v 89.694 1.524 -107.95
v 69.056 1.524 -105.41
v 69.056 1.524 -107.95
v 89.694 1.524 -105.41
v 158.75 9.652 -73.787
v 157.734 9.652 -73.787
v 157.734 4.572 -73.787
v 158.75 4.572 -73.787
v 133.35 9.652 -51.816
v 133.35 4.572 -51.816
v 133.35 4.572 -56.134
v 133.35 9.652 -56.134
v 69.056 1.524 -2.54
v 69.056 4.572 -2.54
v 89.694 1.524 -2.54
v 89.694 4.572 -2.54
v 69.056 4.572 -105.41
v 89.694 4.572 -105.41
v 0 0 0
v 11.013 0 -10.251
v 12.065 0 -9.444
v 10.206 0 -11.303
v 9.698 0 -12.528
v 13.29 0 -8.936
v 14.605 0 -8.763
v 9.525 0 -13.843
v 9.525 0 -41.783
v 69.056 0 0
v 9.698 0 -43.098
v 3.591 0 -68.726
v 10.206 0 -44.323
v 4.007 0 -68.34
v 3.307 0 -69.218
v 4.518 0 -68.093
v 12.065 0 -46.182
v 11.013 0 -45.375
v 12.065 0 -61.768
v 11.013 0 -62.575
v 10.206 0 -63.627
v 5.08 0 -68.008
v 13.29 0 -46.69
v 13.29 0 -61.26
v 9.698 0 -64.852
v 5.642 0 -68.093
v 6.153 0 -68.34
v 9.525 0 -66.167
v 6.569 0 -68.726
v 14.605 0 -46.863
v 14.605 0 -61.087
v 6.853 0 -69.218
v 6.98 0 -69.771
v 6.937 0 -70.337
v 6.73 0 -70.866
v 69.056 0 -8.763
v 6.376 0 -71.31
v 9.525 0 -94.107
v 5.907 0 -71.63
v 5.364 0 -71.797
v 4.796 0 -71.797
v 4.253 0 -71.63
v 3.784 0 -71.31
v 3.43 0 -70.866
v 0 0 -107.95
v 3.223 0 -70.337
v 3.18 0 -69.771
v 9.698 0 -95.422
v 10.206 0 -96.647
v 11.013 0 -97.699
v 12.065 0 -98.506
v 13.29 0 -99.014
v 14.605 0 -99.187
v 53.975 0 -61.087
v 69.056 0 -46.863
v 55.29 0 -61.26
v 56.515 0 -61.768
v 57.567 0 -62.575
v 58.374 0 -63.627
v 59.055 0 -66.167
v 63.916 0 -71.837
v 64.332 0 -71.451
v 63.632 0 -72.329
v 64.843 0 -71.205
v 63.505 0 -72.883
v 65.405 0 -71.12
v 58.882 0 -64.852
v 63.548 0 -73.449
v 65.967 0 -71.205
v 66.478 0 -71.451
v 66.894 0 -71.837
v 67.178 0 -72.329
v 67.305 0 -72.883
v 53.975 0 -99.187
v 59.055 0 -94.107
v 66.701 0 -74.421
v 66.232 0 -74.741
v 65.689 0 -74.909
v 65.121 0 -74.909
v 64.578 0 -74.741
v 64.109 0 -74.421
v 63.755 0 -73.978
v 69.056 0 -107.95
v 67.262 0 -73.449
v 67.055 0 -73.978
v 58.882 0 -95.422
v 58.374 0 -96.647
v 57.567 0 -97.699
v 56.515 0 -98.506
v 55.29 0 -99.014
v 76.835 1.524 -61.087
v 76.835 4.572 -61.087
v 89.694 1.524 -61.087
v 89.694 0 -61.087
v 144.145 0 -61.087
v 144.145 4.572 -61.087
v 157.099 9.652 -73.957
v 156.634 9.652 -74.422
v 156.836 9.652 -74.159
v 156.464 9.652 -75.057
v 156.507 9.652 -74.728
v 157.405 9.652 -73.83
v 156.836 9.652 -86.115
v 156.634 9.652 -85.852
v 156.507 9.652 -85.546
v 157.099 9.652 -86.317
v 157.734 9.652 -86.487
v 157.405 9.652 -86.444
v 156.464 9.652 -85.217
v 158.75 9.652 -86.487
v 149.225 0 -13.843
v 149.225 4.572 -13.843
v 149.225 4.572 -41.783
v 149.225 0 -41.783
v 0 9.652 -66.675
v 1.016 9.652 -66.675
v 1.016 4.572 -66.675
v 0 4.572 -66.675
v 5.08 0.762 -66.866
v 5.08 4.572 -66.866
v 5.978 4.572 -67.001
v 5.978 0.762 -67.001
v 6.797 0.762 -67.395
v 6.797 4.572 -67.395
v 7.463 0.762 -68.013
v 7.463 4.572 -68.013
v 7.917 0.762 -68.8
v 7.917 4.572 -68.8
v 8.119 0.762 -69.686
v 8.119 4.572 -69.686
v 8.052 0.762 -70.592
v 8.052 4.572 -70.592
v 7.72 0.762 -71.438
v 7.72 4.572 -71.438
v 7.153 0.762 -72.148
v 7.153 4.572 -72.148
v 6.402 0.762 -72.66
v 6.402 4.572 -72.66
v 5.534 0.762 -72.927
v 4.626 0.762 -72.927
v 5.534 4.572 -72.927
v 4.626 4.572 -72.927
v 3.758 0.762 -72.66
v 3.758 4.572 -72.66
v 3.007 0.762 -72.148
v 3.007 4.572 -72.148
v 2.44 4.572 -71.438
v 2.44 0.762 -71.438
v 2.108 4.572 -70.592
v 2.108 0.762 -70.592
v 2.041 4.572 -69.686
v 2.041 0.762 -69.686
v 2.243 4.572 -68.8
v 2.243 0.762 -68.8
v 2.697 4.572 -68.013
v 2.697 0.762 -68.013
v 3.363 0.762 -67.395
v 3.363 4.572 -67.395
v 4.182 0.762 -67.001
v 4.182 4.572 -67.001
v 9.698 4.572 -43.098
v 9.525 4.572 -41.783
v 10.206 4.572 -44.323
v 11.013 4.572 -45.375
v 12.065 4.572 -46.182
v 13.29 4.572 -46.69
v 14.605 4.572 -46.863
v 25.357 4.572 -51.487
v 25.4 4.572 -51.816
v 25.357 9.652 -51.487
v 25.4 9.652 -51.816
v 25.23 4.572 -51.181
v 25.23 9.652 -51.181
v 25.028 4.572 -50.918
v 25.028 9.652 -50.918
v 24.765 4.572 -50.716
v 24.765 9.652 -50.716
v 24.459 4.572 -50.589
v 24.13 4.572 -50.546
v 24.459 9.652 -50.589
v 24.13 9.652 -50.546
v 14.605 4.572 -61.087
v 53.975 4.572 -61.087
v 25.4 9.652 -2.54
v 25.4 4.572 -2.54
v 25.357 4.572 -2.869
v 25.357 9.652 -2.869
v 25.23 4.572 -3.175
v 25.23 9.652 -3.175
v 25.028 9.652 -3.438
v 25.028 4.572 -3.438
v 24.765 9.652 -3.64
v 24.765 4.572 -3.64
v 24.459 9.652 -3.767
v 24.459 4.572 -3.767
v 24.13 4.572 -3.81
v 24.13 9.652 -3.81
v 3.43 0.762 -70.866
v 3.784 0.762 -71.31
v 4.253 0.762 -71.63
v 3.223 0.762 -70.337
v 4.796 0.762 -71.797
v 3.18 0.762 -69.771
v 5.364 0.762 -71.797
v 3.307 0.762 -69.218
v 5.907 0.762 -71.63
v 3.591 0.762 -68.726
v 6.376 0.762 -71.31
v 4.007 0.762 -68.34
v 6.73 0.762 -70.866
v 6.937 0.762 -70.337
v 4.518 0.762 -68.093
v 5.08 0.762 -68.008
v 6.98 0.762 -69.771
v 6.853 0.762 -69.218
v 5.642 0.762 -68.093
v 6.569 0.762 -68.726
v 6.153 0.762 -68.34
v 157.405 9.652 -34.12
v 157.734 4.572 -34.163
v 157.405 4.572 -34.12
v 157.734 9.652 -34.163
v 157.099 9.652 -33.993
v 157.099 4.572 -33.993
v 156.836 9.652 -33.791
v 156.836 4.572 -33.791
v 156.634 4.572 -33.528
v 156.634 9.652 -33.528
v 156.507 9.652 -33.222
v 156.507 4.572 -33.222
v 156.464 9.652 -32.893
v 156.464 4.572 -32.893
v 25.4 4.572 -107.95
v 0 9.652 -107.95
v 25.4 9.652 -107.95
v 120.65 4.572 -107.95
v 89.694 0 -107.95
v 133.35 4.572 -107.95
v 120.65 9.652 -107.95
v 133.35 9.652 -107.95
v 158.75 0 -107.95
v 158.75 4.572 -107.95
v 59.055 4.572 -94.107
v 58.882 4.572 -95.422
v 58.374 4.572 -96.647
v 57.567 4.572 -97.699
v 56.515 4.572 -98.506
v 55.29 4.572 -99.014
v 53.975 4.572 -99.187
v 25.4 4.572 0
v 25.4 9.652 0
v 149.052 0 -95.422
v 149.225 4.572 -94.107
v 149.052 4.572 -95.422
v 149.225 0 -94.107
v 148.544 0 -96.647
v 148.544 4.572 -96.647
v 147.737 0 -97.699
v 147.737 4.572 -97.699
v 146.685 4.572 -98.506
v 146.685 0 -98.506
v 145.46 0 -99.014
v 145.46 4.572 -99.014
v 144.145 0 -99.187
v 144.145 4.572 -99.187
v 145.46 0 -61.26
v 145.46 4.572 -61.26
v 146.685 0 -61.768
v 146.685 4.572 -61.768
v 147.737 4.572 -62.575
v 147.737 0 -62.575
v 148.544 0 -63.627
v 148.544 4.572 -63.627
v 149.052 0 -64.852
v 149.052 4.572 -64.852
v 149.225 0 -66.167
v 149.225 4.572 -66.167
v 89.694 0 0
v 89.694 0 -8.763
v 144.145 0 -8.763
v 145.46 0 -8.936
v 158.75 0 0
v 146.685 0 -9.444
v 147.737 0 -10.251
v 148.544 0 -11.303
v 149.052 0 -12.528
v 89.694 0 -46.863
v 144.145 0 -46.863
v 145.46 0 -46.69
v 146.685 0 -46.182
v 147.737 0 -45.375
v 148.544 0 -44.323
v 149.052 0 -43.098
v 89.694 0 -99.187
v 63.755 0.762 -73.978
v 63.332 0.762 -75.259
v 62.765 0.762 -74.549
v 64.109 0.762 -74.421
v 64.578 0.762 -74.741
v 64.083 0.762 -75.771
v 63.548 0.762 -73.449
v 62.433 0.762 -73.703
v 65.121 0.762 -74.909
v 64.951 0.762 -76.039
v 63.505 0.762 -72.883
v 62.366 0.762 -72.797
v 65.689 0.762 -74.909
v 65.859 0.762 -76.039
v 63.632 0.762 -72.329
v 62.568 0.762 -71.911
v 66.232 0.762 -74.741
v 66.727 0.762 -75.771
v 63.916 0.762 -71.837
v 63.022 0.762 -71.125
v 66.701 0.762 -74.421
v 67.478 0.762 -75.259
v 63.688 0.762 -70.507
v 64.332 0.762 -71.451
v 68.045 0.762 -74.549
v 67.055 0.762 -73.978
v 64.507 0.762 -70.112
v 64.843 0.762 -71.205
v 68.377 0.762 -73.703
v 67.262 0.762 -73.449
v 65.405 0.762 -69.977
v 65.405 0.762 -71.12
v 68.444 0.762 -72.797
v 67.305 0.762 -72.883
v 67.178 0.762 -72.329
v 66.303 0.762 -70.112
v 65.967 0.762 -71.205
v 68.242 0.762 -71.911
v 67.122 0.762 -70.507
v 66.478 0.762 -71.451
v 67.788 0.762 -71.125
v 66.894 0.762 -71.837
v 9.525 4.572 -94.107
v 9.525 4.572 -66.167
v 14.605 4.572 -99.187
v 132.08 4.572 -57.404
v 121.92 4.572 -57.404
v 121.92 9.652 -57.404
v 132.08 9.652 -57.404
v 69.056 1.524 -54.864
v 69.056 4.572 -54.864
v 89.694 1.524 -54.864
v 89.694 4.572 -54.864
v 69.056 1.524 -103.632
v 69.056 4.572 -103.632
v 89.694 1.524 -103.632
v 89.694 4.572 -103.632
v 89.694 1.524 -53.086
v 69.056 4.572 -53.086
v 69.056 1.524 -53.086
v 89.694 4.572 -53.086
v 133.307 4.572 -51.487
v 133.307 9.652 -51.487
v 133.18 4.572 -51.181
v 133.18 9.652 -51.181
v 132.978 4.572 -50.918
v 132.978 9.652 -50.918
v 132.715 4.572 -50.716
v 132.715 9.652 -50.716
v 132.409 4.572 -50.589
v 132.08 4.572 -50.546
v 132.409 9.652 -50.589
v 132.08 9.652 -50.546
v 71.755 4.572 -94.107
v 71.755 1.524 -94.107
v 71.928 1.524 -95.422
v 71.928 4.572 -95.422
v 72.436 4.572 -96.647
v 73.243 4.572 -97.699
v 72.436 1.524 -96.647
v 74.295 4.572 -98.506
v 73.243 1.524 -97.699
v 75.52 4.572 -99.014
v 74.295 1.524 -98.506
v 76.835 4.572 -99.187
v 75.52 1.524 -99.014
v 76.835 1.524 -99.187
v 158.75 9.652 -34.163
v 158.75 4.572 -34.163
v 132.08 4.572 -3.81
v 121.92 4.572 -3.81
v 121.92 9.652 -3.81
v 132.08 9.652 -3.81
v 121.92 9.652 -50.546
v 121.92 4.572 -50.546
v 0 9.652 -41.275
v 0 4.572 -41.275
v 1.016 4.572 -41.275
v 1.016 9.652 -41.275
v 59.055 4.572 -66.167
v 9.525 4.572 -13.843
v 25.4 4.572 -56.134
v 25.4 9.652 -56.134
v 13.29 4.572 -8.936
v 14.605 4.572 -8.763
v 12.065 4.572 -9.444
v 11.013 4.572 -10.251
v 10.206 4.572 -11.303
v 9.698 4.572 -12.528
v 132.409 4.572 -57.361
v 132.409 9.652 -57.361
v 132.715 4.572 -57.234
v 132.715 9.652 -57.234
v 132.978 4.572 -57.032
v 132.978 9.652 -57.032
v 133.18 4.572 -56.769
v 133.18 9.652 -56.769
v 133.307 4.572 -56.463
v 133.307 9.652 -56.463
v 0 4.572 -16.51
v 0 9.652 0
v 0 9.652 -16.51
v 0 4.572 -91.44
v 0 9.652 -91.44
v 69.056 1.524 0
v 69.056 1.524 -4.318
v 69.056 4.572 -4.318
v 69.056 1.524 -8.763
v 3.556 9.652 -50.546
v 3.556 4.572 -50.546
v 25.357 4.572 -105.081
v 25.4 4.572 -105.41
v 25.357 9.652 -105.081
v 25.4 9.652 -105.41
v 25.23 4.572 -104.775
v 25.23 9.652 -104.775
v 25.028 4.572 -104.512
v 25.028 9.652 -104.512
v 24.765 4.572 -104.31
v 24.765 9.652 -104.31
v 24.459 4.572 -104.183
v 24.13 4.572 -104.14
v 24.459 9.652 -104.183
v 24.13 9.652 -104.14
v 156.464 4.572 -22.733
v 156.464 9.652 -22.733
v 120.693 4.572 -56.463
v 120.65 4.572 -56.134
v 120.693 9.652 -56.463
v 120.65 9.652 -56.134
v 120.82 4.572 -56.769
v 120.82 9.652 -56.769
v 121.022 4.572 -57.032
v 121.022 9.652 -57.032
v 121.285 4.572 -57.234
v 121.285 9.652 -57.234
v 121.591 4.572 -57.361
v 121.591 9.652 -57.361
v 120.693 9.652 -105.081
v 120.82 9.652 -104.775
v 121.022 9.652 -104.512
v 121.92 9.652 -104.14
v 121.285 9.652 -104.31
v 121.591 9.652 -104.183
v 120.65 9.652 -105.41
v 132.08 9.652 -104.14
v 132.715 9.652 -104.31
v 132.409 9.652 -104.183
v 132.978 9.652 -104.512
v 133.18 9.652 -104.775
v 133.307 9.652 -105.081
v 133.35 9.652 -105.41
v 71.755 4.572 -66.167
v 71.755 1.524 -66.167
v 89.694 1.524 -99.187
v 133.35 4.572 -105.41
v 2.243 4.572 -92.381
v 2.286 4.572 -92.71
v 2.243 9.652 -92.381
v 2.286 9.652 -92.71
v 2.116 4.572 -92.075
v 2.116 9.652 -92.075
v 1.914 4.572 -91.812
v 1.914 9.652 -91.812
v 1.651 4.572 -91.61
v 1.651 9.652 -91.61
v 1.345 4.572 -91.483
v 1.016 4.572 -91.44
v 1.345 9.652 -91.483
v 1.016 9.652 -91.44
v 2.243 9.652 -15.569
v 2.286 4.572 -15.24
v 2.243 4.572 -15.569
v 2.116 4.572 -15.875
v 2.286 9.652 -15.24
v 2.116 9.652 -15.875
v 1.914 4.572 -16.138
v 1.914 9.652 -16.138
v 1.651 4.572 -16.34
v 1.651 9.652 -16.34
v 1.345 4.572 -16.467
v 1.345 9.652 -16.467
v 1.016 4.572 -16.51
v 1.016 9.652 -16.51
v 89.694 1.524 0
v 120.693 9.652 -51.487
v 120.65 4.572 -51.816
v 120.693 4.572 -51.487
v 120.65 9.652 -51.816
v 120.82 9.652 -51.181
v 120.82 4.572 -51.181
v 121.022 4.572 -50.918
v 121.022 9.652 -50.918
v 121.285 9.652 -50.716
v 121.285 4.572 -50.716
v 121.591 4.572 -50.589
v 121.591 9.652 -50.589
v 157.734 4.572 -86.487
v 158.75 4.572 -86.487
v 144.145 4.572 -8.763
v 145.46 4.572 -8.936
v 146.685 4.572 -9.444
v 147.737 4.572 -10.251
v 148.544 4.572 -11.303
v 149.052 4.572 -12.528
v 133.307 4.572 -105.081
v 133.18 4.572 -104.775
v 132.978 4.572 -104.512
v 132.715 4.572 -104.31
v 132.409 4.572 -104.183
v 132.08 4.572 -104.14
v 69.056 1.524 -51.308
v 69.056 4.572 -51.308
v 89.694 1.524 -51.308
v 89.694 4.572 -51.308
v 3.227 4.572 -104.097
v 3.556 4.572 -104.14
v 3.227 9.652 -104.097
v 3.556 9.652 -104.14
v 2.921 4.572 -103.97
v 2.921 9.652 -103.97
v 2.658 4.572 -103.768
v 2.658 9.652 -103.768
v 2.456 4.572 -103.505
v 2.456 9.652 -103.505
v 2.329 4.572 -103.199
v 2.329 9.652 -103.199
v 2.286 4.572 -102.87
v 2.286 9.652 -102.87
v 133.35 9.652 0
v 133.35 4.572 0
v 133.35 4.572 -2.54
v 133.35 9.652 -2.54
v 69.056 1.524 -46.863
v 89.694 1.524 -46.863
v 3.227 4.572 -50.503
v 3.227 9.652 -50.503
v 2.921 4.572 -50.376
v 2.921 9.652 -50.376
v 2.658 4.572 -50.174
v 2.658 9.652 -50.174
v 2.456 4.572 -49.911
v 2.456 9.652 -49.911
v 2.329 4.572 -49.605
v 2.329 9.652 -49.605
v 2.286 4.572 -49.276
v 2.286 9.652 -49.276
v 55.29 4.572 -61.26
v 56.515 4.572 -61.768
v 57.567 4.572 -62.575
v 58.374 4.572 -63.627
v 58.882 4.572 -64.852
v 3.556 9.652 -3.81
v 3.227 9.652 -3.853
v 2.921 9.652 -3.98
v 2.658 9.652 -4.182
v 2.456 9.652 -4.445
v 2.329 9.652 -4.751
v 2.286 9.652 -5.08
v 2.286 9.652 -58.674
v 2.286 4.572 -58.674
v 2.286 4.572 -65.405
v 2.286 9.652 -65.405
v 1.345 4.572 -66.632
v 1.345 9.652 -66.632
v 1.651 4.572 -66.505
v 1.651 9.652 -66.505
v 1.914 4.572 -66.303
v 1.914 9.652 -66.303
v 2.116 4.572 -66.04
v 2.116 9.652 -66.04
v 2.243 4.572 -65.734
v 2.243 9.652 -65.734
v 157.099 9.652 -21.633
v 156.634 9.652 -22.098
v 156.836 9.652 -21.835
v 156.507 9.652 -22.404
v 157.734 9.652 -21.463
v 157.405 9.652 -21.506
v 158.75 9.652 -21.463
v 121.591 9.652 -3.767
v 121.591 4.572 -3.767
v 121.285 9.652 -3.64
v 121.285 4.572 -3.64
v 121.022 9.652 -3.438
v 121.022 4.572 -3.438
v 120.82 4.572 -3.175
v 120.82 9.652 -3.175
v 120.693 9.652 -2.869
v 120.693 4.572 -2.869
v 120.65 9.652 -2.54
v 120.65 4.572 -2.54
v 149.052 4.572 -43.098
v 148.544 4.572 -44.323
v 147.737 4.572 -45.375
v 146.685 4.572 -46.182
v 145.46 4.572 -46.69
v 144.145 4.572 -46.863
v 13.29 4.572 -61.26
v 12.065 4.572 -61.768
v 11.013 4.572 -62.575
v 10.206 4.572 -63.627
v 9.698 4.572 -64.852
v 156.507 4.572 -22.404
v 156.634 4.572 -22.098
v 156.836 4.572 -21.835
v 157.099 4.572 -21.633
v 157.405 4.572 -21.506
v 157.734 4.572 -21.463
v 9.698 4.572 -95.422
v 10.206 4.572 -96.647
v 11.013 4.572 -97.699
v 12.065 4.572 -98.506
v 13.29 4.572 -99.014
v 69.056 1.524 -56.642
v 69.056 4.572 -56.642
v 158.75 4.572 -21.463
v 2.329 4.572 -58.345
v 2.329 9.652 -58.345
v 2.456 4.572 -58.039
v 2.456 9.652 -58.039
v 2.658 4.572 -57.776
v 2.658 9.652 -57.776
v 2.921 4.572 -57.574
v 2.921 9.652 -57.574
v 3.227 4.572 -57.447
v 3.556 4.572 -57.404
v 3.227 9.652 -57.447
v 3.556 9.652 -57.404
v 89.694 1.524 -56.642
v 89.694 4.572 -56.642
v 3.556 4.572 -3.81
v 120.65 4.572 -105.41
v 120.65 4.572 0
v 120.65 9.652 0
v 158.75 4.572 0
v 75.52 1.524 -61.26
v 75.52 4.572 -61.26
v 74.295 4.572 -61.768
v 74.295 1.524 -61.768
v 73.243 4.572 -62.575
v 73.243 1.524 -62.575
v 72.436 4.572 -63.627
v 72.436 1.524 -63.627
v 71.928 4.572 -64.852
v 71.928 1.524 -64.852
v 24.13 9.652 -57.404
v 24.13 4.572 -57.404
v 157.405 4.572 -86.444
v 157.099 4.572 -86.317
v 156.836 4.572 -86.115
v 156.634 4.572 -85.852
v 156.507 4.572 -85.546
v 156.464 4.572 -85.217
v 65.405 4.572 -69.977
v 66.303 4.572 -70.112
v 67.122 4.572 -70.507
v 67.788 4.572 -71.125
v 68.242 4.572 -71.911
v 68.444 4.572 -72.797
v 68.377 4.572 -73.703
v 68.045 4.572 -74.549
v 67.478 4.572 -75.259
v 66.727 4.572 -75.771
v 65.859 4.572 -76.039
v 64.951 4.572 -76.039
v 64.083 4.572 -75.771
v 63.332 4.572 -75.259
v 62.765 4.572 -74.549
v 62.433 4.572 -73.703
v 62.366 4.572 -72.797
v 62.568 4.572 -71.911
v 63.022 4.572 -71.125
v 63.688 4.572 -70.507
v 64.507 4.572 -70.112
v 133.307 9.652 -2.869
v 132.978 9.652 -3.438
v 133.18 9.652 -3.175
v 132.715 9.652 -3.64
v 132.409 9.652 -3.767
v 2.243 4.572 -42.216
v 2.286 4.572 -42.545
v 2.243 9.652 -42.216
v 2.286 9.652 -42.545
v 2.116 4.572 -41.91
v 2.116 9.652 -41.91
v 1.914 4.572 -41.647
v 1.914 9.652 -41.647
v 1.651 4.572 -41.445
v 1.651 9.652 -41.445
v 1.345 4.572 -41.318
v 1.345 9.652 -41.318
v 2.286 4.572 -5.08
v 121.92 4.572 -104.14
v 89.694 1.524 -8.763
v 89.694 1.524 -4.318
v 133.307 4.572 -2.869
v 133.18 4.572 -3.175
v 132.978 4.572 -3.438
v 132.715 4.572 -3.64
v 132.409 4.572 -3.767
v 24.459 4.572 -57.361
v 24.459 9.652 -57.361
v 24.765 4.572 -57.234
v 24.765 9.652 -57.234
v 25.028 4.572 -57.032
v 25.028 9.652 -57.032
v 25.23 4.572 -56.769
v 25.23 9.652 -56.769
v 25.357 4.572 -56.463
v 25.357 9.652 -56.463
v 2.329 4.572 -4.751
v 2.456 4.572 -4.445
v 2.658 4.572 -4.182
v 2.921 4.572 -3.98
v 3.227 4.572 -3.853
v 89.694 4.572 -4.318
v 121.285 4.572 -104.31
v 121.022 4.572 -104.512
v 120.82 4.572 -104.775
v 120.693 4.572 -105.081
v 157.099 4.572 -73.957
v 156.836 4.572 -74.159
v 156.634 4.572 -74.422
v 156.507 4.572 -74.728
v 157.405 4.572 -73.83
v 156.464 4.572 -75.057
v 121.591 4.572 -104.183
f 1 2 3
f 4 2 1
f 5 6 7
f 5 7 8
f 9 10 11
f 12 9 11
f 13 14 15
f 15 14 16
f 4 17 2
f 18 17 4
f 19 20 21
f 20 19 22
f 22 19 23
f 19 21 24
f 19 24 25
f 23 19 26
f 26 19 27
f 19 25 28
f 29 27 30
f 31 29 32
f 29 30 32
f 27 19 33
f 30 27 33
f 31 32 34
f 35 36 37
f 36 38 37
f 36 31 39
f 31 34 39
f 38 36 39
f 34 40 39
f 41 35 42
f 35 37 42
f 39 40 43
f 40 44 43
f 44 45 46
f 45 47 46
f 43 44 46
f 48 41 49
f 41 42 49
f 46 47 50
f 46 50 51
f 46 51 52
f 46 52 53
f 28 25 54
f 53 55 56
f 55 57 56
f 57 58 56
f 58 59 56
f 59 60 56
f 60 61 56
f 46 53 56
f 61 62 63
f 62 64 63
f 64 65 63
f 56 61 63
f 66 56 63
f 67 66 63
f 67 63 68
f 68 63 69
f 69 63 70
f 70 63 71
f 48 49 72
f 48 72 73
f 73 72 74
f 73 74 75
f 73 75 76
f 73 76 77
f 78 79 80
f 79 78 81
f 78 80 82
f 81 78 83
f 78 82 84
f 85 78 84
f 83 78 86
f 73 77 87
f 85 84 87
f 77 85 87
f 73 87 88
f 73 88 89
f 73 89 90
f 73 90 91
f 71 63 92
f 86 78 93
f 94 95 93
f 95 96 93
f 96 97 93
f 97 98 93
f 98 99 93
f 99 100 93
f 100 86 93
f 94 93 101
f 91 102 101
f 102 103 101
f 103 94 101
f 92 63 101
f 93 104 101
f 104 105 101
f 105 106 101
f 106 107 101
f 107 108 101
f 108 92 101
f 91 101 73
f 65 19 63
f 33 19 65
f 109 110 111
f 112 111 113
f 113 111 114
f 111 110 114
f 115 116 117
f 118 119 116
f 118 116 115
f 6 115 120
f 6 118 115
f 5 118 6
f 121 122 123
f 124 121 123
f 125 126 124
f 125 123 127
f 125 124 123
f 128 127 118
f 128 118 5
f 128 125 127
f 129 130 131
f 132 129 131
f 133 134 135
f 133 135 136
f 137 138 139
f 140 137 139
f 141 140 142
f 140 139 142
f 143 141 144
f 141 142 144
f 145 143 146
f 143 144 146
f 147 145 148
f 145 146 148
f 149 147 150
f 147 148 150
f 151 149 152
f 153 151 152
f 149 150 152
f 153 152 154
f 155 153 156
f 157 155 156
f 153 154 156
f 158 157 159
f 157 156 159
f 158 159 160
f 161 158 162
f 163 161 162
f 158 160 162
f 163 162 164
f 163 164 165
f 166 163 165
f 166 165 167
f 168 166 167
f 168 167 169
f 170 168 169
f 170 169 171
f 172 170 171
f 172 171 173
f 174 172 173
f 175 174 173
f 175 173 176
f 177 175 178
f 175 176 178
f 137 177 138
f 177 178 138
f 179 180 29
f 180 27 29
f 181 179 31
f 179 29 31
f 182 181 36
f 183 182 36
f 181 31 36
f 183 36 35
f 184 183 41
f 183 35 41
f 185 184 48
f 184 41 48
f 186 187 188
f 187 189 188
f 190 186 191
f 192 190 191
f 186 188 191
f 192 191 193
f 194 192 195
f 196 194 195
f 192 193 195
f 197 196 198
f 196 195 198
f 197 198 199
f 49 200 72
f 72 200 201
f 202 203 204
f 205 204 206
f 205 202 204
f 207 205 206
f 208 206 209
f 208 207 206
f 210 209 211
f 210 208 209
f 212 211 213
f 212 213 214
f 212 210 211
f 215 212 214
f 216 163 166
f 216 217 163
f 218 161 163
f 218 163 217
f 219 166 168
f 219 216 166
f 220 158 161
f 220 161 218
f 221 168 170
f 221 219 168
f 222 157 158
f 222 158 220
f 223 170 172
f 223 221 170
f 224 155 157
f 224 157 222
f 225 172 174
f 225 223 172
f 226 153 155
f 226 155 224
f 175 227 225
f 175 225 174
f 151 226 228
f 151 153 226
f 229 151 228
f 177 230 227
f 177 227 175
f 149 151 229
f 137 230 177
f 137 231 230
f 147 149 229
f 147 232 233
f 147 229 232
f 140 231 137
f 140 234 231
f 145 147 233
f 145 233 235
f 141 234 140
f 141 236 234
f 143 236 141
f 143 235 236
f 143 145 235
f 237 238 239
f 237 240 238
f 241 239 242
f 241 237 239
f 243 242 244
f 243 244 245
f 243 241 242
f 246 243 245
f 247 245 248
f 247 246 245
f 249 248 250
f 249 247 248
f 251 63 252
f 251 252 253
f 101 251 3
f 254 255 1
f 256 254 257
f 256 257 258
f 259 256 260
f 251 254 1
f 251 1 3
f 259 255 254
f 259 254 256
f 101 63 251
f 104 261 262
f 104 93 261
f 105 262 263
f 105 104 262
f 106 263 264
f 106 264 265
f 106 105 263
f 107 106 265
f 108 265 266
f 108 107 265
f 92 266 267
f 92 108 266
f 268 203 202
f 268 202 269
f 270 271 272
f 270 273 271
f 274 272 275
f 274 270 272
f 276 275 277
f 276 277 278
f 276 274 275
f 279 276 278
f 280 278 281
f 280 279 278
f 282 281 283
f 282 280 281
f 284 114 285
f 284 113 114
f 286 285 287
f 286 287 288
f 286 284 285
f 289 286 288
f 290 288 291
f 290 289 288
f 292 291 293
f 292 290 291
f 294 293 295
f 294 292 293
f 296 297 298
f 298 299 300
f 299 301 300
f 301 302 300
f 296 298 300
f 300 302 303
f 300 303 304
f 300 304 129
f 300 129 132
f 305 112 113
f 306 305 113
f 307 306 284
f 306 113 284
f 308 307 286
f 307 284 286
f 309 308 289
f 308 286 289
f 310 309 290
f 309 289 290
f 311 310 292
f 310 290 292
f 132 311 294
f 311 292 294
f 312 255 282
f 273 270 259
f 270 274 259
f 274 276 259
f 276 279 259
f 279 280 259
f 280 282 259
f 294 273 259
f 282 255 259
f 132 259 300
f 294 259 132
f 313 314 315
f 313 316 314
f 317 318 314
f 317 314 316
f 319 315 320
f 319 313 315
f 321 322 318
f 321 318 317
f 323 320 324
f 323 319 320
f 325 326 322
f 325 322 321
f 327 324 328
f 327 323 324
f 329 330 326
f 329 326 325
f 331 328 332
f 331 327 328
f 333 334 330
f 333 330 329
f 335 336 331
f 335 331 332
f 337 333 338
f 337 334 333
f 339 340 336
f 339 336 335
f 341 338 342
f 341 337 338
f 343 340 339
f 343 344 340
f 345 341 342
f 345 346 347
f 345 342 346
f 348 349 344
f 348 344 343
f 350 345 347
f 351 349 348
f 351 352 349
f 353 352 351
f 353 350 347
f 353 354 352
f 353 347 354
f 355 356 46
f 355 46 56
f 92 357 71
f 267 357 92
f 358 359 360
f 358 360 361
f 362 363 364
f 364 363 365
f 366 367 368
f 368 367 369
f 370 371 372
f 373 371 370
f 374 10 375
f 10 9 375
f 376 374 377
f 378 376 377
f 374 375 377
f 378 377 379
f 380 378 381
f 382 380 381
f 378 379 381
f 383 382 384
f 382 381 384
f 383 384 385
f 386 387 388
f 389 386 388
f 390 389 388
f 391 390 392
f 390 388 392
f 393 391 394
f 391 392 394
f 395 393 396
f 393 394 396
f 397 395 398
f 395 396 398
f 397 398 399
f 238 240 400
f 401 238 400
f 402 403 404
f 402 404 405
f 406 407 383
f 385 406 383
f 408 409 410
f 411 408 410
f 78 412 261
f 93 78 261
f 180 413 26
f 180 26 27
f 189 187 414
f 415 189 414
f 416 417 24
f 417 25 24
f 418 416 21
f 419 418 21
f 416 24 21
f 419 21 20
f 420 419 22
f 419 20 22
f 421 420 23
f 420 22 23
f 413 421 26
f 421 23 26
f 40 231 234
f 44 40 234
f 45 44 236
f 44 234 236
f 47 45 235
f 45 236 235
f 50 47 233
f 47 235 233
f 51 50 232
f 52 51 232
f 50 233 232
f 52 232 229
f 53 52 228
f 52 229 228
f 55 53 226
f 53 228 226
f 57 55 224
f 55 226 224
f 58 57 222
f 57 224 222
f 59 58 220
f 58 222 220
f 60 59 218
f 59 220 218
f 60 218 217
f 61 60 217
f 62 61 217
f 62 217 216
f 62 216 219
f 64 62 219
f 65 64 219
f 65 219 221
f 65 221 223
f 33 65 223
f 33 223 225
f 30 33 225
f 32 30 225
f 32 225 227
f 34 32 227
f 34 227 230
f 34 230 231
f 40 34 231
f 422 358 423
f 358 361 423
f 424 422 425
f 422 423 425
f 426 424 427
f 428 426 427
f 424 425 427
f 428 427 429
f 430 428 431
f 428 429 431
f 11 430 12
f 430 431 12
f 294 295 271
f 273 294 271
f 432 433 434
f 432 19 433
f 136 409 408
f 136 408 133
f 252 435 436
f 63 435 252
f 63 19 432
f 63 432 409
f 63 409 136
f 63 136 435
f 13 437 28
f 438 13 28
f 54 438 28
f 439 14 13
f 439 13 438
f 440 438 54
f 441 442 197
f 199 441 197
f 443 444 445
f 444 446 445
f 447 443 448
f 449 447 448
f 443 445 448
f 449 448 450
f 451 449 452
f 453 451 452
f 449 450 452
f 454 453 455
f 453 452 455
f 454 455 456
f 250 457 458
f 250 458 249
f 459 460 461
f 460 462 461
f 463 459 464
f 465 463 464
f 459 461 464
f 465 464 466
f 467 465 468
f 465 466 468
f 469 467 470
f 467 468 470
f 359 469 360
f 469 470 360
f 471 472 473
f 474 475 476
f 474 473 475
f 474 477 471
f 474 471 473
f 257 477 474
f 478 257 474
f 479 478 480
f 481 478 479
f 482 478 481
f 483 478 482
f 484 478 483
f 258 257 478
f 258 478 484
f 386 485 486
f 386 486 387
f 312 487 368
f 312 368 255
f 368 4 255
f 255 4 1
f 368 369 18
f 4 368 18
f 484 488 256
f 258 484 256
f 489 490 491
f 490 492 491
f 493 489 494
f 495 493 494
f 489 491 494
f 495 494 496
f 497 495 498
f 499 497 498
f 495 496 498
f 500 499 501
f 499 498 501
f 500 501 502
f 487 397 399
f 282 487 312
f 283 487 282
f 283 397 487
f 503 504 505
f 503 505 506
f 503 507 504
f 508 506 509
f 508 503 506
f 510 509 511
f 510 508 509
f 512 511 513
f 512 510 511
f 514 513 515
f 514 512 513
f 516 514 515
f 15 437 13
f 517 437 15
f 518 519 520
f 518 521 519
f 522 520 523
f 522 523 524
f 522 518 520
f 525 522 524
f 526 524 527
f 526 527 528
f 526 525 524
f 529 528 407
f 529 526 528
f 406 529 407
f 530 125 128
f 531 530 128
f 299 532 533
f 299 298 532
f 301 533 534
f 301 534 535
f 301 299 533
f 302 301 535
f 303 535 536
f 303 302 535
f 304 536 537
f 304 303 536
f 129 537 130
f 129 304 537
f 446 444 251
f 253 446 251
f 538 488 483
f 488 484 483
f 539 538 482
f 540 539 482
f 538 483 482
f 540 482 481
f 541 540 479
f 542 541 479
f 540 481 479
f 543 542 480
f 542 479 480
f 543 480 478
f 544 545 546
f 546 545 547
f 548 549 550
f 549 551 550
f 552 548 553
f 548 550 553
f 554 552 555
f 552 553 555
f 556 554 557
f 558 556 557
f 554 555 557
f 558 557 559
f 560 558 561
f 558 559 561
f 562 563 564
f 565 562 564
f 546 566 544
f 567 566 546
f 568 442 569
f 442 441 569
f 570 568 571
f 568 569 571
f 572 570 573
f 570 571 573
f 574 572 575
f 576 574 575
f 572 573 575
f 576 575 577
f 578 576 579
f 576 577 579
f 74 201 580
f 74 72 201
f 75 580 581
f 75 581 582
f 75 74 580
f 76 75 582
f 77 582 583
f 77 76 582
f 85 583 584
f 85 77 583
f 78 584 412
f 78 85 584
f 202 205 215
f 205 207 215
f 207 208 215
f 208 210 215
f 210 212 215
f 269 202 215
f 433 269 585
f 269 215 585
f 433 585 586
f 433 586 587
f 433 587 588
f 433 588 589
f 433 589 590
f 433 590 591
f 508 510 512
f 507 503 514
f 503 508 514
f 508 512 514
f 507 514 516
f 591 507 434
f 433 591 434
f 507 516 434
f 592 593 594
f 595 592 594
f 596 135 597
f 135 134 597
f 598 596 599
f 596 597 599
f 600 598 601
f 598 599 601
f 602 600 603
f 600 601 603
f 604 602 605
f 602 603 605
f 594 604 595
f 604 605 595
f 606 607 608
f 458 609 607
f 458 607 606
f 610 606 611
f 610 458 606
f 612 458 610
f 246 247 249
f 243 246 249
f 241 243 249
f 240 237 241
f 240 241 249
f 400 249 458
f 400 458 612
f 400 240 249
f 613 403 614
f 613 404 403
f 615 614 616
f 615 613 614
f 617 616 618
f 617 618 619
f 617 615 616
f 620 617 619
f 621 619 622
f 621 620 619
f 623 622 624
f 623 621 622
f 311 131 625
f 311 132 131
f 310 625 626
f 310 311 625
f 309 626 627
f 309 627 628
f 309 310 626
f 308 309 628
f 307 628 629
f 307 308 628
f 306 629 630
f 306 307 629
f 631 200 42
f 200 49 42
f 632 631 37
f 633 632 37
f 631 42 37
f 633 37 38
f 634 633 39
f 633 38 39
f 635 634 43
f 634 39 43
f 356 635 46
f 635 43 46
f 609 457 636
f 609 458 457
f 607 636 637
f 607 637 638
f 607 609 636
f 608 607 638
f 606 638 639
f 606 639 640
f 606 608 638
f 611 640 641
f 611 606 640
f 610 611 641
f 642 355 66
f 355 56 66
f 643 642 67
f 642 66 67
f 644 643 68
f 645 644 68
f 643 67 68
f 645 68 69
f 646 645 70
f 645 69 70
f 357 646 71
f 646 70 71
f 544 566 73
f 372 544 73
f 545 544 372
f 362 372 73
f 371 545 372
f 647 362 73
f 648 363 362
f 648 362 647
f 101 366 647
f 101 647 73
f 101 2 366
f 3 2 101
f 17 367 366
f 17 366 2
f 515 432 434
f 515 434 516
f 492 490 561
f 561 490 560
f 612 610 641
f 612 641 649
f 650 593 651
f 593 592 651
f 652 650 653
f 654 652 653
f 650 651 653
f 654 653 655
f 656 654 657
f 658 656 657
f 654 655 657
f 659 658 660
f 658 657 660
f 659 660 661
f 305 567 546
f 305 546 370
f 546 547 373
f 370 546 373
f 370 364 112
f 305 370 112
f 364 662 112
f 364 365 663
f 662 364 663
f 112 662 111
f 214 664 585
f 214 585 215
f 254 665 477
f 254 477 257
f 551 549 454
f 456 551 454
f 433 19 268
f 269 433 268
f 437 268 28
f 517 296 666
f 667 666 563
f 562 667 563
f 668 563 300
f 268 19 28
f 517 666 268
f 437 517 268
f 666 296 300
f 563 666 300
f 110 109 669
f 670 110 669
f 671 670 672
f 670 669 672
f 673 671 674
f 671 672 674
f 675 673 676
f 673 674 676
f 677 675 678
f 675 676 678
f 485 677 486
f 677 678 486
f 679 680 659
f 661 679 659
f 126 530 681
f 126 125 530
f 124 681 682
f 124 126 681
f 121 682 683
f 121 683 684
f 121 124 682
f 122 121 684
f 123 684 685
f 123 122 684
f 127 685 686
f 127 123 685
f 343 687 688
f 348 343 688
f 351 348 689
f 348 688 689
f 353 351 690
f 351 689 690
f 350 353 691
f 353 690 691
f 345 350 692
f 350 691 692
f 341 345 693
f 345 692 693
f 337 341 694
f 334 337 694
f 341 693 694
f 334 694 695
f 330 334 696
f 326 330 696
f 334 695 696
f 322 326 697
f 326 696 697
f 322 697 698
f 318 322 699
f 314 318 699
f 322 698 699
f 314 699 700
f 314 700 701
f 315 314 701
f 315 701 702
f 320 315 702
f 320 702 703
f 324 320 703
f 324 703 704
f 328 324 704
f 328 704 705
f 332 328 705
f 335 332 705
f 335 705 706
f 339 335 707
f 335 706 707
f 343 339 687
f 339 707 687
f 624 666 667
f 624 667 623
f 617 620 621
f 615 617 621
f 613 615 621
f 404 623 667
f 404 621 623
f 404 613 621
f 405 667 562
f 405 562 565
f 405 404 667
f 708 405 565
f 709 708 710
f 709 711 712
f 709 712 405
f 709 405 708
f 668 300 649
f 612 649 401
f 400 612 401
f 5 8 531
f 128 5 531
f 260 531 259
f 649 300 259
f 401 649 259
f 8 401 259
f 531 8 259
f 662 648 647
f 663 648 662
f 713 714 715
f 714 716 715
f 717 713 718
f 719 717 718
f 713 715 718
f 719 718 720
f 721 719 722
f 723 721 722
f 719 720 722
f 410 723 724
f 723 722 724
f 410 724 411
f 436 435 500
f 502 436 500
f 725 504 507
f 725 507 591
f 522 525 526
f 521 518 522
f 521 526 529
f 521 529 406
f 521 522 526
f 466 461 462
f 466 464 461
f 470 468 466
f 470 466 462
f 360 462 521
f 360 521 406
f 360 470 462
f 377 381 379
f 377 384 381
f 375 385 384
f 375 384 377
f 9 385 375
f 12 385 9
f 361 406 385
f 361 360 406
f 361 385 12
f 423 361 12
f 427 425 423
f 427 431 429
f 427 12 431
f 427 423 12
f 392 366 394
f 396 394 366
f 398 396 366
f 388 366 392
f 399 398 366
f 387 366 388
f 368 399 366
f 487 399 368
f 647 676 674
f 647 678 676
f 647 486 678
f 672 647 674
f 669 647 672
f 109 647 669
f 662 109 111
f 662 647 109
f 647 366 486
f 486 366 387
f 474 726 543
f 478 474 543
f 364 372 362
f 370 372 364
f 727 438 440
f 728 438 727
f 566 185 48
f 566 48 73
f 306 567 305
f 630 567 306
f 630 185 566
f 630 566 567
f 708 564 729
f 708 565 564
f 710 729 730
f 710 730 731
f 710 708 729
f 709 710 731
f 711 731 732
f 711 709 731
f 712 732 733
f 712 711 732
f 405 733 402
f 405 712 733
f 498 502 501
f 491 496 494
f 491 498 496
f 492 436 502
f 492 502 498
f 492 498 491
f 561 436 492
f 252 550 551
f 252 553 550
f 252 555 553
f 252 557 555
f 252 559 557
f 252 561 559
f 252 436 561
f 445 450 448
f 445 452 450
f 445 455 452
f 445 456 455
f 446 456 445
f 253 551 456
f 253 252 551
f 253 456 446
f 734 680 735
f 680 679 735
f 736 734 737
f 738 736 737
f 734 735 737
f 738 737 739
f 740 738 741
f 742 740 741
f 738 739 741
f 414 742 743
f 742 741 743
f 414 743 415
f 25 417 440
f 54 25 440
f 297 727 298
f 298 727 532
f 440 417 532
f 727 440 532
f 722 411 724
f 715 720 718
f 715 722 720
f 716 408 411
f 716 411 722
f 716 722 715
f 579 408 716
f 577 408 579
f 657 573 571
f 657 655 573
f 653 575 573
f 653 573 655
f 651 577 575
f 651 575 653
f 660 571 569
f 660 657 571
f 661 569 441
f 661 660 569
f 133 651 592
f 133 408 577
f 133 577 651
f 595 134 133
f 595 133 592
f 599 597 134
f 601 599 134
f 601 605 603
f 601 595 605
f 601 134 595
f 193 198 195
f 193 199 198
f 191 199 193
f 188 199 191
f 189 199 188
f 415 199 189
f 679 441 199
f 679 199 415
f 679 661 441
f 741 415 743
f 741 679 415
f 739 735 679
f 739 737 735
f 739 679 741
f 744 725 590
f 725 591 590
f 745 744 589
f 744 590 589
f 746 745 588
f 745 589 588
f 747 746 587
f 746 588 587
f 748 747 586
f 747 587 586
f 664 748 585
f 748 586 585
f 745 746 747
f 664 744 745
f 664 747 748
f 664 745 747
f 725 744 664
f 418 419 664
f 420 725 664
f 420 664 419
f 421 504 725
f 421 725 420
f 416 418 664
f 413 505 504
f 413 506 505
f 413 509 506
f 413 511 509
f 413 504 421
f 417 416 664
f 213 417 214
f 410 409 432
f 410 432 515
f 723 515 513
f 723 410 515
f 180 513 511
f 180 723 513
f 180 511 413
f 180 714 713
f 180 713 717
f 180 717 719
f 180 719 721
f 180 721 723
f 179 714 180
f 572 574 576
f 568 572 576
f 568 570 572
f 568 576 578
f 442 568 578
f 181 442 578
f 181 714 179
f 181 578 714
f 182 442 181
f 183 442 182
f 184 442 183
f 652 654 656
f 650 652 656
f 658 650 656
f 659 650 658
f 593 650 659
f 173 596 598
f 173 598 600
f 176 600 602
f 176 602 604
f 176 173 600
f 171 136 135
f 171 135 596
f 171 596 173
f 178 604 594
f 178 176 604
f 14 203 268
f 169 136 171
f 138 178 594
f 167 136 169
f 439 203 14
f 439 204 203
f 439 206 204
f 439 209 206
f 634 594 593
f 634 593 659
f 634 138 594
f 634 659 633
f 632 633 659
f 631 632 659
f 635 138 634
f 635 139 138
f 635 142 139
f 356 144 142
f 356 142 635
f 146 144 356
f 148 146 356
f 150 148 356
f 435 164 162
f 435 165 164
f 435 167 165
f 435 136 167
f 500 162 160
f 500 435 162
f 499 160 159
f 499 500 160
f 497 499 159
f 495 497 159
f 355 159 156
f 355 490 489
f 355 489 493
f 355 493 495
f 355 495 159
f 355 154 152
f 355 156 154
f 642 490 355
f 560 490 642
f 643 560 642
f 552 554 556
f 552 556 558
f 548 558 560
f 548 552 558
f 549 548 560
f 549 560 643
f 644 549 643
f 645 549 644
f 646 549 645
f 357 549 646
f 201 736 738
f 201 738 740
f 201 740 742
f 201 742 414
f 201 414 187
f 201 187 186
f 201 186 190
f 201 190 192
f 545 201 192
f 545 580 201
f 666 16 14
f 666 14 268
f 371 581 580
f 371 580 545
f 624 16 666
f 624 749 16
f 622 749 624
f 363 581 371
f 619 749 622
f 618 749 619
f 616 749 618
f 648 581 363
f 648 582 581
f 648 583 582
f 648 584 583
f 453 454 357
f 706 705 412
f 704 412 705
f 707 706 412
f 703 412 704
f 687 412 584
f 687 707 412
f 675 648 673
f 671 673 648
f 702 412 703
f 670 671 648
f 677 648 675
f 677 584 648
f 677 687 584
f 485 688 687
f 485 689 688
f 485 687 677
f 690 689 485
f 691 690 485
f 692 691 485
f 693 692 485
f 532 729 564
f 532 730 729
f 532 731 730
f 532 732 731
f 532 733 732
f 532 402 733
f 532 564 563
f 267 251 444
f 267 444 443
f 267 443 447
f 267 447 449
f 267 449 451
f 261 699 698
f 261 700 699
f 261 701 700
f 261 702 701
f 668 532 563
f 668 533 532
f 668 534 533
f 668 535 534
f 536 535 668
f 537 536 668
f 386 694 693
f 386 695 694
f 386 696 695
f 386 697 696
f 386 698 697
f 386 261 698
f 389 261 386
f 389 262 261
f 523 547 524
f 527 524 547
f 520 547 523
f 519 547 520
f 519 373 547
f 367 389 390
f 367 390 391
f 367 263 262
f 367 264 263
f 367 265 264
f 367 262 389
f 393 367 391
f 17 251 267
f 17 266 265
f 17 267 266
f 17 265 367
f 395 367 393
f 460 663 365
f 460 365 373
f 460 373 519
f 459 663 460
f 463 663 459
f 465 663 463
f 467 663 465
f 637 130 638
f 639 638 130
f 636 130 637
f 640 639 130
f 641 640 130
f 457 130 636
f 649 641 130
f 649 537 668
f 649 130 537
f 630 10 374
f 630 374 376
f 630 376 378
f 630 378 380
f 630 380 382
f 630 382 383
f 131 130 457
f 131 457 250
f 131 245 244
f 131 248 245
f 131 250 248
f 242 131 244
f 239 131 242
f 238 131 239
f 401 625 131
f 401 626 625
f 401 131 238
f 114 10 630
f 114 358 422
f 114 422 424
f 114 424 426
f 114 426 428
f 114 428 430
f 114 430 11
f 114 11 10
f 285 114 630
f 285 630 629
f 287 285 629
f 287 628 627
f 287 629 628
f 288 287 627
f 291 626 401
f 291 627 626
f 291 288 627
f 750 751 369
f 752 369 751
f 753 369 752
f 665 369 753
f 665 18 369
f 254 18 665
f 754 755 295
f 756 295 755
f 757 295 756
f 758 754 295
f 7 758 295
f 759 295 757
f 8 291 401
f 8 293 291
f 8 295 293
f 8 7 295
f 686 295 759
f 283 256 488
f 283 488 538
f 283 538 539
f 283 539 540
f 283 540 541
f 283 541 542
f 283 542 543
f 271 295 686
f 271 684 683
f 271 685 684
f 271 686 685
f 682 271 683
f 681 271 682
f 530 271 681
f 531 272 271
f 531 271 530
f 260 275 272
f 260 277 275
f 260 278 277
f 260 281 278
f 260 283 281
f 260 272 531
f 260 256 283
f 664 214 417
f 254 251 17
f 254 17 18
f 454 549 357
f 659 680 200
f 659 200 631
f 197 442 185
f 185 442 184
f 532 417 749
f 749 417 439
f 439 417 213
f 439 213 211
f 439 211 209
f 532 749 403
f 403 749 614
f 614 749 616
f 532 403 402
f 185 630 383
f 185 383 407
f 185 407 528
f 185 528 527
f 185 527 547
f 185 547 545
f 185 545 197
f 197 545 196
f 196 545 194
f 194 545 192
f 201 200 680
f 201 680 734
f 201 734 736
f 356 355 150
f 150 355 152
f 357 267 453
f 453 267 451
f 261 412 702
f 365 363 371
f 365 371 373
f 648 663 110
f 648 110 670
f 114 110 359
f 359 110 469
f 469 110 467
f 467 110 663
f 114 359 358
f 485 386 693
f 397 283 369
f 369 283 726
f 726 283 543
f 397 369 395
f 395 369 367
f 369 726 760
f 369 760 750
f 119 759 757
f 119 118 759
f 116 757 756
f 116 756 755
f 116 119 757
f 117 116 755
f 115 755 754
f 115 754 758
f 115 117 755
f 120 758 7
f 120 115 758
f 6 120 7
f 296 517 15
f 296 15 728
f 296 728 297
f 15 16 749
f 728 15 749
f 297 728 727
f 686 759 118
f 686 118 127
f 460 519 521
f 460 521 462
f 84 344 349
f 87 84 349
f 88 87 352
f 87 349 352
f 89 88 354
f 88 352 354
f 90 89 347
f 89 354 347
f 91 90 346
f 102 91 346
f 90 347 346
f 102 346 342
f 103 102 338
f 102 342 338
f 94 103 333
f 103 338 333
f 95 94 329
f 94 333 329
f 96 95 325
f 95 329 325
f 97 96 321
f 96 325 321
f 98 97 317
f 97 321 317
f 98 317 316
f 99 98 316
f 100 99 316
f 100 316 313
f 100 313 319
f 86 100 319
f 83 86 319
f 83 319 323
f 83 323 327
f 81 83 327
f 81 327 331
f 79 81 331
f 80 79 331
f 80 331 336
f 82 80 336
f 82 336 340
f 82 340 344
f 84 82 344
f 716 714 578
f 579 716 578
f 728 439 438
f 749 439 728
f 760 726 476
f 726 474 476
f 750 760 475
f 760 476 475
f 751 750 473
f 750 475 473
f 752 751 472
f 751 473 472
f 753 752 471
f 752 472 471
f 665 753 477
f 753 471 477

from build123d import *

# Parameters (mm, degrees)
SKETCH3_W                          = 158.75
SKETCH3_H                          = 107.95
BASE_EXTRUDE_DEPTH                 = 4.572
SKETCH4_W                          = 20.6375
SKETCH4_H                          = 1.778
SKETCH4_W_2                        = 139.7
SKETCH4_H_2                        = 38.1
VELCRO_SLITS_DEPTH                 = 193.030383492
SKETCH6_W                          = 2.286
SKETCH6_H                          = 12.7
SKETCH6_W_2                        = 12.7
SKETCH6_H_2                        = 3.81
SKETCH6_H_3                        = 6.858
POSITION_GUIDES_DEPTH              = 5.08
FILLET1_R                          = 1.27
SKETCH7_R                          = 1.905
SKETCH7_W                          = 12.7
SKETCH7_H                          = 38.1
RIGHT_SCREW_HOLE_AND_SUPPORT_DEPTH = 4.572
SKETCH10_R                         = 1.905
LEFT_SCREW_HOLE_DEPTH              = 193.043149839
FILLET2_R                          = 5.08
SKETCH11_R                         = 3.048
SCREWHEAD_CUTOUTS_DEPTH            = 3.81
SKETCH5_W                          = 20.6375
SKETCH5_H                          = 1.524
CUT_EXTRUDE1_DEPTH                 = 193.21843331


with BuildPart() as part:
    # Sketch3 → Base Extrude (new body)
    with BuildSketch(Plane(origin=(0, 0, 0), x_dir=(1, 0, 0), z_dir=(0, 1, 0))):
        with Locations((79.375, 53.975)):
            Rectangle(SKETCH3_W, SKETCH3_H)
    extrude(amount=BASE_EXTRUDE_DEPTH)

    # Sketch4 → Velcro slits (cut, through all)
    with BuildSketch(Plane(origin=(0, 4.572, 0), x_dir=(1, 0, 0), z_dir=(0, 1, 0))):
        with Locations((79.375, 104.521)):
            Rectangle(SKETCH4_W, SKETCH4_H)
        with Locations((79.375, 55.753)):
            Rectangle(SKETCH4_W, SKETCH4_H)
        with Locations((79.375, 52.197)):
            Rectangle(SKETCH4_W, SKETCH4_H)
        with Locations((79.375, 3.429)):
            Rectangle(SKETCH4_W, SKETCH4_H)
        with Locations((79.375, 27.813)):
            Rectangle(SKETCH4_W_2, SKETCH4_H_2)
        with Locations((79.375, 80.137)):
            Rectangle(SKETCH4_W_2, SKETCH4_H_2)
    extrude(amount=-VELCRO_SLITS_DEPTH, mode=Mode.SUBTRACT)

    # Sketch6 → Position Guides (add)
    with BuildSketch(Plane(origin=(0, 4.572, 0), x_dir=(1, 0, 0), z_dir=(0, 1, 0))):
        Polygon((2.286, 16.51), (2.286, 3.81), (25.4, 3.81), (25.4, 0), (0, 0), (0, 16.51), align=None)
        Polygon((2.286, 41.275), (2.286, 50.546), (25.4, 50.546), (25.4, 57.404), (2.286, 57.404), (2.286, 66.675), (0, 66.675), (0, 41.275), align=None)
        Polygon((0, 91.44), (2.286, 91.44), (2.286, 104.14), (25.4, 104.14), (25.4, 107.95), (0, 107.95), align=None)
        with Locations((157.607, 80.137)):
            Rectangle(SKETCH6_W, SKETCH6_H)
        with Locations((157.607, 27.813)):
            Rectangle(SKETCH6_W, SKETCH6_H)
        with Locations((127, 106.045)):
            Rectangle(SKETCH6_W_2, SKETCH6_H_2)
        with Locations((127, 53.975)):
            Rectangle(SKETCH6_W_2, SKETCH6_H_3)
        with Locations((127, 1.905)):
            Rectangle(SKETCH6_W_2, SKETCH6_H_2)
    extrude(amount=POSITION_GUIDES_DEPTH)

    # Fillet1
    fillet1_edges = [part.edges().sort_by_distance(p)[0] for p in [
        (2.286, 7.112, -16.51),
        (25.4, 7.112, -3.81),
        (2.286, 7.112, -3.81),
        (2.286, 7.112, -41.275),
        (2.286, 7.112, -50.546),
        (25.4, 7.112, -50.546),
        (25.4, 7.112, -57.404),
        (2.286, 7.112, -57.404),
        (2.286, 7.112, -66.675),
        (2.286, 7.112, -91.44),
        (2.286, 7.112, -104.14),
        (25.4, 7.112, -104.14),
        (156.464, 7.112, -86.487),
        (156.464, 7.112, -73.787),
        (156.464, 7.112, -34.163),
        (156.464, 7.112, -21.463),
        (120.65, 7.112, -57.404),
        (120.65, 7.112, -50.546),
        (133.35, 7.112, -50.546),
        (133.35, 7.112, -57.404),
        (133.35, 7.112, -104.14),
        (120.65, 7.112, -104.14),
        (133.35, 7.112, -3.81),
        (120.65, 7.112, -3.81),
    ]]
    fillet(fillet1_edges, radius=FILLET1_R)

    # Sketch7 → Right screw hole and support (add)
    # profile 1 of 2: a face of its own
    with BuildSketch(Plane(origin=(0, 4.572, 0), x_dir=(1, 0, 0), z_dir=(0, 1, 0))):
        with Locations((5.08, 69.85)):
            Circle(SKETCH7_R)
    # profile 2 of 2: a face of its own
    with BuildSketch(Plane(origin=(0, 4.572, 0), x_dir=(1, 0, 0), z_dir=(0, 1, 0))):
        with Locations((65.405, 80.137)):
            Rectangle(SKETCH7_W, SKETCH7_H)
        with Locations(Location((65.405, 73.025, 0), (0, 0, 270))):
            Circle(SKETCH7_R, mode=Mode.SUBTRACT)
    extrude(amount=-RIGHT_SCREW_HOLE_AND_SUPPORT_DEPTH)

    # Sketch10 → Left Screw Hole (cut, through all)
    with BuildSketch(Plane(origin=(0, 4.572, 0), x_dir=(1, 0, 0), z_dir=(0, 1, 0))):
        with Locations(Location((5.08, 69.9135, 0), (0, 0, 270))):
            Circle(SKETCH10_R)
    extrude(amount=-LEFT_SCREW_HOLE_DEPTH, mode=Mode.SUBTRACT)

    # Fillet2
    fillet2_edges = [part.edges().sort_by_distance(p)[0] for p in [
        (59.055, 2.286, -99.187),
        (71.755, 2.286, -99.187),
        (71.755, 2.286, -61.087),
        (59.055, 2.286, -61.087),
        (9.525, 2.286, -8.763),
        (9.525, 2.286, -46.863),
        (149.225, 2.286, -46.863),
        (149.225, 2.286, -8.763),
        (9.525, 2.286, -61.087),
        (9.525, 2.286, -99.187),
        (149.225, 2.286, -99.187),
        (149.225, 2.286, -61.087),
    ]]
    fillet(fillet2_edges, radius=FILLET2_R)

    # Sketch11 → Screwhead cutouts (cut)
    with BuildSketch(Plane(origin=(0, 4.572, 0), x_dir=(1, 0, 0), z_dir=(0, 1, 0))):
        with Locations(Location((5.08, 69.9135, 0), (0, 0, 270))):
            Circle(SKETCH11_R)
        with Locations(Location((65.405, 73.025, 0), (0, 0, 270))):
            Circle(SKETCH11_R)
    extrude(amount=-SCREWHEAD_CUTOUTS_DEPTH, mode=Mode.SUBTRACT)

    # Sketch5 → Cut-Extrude1 (cut, through all)
    with BuildSketch(Plane.XY):
        with Locations((79.375, 0.762)):
            Rectangle(SKETCH5_W, SKETCH5_H)
    extrude(amount=-CUT_EXTRUDE1_DEPTH, mode=Mode.SUBTRACT)


solid = part.part
